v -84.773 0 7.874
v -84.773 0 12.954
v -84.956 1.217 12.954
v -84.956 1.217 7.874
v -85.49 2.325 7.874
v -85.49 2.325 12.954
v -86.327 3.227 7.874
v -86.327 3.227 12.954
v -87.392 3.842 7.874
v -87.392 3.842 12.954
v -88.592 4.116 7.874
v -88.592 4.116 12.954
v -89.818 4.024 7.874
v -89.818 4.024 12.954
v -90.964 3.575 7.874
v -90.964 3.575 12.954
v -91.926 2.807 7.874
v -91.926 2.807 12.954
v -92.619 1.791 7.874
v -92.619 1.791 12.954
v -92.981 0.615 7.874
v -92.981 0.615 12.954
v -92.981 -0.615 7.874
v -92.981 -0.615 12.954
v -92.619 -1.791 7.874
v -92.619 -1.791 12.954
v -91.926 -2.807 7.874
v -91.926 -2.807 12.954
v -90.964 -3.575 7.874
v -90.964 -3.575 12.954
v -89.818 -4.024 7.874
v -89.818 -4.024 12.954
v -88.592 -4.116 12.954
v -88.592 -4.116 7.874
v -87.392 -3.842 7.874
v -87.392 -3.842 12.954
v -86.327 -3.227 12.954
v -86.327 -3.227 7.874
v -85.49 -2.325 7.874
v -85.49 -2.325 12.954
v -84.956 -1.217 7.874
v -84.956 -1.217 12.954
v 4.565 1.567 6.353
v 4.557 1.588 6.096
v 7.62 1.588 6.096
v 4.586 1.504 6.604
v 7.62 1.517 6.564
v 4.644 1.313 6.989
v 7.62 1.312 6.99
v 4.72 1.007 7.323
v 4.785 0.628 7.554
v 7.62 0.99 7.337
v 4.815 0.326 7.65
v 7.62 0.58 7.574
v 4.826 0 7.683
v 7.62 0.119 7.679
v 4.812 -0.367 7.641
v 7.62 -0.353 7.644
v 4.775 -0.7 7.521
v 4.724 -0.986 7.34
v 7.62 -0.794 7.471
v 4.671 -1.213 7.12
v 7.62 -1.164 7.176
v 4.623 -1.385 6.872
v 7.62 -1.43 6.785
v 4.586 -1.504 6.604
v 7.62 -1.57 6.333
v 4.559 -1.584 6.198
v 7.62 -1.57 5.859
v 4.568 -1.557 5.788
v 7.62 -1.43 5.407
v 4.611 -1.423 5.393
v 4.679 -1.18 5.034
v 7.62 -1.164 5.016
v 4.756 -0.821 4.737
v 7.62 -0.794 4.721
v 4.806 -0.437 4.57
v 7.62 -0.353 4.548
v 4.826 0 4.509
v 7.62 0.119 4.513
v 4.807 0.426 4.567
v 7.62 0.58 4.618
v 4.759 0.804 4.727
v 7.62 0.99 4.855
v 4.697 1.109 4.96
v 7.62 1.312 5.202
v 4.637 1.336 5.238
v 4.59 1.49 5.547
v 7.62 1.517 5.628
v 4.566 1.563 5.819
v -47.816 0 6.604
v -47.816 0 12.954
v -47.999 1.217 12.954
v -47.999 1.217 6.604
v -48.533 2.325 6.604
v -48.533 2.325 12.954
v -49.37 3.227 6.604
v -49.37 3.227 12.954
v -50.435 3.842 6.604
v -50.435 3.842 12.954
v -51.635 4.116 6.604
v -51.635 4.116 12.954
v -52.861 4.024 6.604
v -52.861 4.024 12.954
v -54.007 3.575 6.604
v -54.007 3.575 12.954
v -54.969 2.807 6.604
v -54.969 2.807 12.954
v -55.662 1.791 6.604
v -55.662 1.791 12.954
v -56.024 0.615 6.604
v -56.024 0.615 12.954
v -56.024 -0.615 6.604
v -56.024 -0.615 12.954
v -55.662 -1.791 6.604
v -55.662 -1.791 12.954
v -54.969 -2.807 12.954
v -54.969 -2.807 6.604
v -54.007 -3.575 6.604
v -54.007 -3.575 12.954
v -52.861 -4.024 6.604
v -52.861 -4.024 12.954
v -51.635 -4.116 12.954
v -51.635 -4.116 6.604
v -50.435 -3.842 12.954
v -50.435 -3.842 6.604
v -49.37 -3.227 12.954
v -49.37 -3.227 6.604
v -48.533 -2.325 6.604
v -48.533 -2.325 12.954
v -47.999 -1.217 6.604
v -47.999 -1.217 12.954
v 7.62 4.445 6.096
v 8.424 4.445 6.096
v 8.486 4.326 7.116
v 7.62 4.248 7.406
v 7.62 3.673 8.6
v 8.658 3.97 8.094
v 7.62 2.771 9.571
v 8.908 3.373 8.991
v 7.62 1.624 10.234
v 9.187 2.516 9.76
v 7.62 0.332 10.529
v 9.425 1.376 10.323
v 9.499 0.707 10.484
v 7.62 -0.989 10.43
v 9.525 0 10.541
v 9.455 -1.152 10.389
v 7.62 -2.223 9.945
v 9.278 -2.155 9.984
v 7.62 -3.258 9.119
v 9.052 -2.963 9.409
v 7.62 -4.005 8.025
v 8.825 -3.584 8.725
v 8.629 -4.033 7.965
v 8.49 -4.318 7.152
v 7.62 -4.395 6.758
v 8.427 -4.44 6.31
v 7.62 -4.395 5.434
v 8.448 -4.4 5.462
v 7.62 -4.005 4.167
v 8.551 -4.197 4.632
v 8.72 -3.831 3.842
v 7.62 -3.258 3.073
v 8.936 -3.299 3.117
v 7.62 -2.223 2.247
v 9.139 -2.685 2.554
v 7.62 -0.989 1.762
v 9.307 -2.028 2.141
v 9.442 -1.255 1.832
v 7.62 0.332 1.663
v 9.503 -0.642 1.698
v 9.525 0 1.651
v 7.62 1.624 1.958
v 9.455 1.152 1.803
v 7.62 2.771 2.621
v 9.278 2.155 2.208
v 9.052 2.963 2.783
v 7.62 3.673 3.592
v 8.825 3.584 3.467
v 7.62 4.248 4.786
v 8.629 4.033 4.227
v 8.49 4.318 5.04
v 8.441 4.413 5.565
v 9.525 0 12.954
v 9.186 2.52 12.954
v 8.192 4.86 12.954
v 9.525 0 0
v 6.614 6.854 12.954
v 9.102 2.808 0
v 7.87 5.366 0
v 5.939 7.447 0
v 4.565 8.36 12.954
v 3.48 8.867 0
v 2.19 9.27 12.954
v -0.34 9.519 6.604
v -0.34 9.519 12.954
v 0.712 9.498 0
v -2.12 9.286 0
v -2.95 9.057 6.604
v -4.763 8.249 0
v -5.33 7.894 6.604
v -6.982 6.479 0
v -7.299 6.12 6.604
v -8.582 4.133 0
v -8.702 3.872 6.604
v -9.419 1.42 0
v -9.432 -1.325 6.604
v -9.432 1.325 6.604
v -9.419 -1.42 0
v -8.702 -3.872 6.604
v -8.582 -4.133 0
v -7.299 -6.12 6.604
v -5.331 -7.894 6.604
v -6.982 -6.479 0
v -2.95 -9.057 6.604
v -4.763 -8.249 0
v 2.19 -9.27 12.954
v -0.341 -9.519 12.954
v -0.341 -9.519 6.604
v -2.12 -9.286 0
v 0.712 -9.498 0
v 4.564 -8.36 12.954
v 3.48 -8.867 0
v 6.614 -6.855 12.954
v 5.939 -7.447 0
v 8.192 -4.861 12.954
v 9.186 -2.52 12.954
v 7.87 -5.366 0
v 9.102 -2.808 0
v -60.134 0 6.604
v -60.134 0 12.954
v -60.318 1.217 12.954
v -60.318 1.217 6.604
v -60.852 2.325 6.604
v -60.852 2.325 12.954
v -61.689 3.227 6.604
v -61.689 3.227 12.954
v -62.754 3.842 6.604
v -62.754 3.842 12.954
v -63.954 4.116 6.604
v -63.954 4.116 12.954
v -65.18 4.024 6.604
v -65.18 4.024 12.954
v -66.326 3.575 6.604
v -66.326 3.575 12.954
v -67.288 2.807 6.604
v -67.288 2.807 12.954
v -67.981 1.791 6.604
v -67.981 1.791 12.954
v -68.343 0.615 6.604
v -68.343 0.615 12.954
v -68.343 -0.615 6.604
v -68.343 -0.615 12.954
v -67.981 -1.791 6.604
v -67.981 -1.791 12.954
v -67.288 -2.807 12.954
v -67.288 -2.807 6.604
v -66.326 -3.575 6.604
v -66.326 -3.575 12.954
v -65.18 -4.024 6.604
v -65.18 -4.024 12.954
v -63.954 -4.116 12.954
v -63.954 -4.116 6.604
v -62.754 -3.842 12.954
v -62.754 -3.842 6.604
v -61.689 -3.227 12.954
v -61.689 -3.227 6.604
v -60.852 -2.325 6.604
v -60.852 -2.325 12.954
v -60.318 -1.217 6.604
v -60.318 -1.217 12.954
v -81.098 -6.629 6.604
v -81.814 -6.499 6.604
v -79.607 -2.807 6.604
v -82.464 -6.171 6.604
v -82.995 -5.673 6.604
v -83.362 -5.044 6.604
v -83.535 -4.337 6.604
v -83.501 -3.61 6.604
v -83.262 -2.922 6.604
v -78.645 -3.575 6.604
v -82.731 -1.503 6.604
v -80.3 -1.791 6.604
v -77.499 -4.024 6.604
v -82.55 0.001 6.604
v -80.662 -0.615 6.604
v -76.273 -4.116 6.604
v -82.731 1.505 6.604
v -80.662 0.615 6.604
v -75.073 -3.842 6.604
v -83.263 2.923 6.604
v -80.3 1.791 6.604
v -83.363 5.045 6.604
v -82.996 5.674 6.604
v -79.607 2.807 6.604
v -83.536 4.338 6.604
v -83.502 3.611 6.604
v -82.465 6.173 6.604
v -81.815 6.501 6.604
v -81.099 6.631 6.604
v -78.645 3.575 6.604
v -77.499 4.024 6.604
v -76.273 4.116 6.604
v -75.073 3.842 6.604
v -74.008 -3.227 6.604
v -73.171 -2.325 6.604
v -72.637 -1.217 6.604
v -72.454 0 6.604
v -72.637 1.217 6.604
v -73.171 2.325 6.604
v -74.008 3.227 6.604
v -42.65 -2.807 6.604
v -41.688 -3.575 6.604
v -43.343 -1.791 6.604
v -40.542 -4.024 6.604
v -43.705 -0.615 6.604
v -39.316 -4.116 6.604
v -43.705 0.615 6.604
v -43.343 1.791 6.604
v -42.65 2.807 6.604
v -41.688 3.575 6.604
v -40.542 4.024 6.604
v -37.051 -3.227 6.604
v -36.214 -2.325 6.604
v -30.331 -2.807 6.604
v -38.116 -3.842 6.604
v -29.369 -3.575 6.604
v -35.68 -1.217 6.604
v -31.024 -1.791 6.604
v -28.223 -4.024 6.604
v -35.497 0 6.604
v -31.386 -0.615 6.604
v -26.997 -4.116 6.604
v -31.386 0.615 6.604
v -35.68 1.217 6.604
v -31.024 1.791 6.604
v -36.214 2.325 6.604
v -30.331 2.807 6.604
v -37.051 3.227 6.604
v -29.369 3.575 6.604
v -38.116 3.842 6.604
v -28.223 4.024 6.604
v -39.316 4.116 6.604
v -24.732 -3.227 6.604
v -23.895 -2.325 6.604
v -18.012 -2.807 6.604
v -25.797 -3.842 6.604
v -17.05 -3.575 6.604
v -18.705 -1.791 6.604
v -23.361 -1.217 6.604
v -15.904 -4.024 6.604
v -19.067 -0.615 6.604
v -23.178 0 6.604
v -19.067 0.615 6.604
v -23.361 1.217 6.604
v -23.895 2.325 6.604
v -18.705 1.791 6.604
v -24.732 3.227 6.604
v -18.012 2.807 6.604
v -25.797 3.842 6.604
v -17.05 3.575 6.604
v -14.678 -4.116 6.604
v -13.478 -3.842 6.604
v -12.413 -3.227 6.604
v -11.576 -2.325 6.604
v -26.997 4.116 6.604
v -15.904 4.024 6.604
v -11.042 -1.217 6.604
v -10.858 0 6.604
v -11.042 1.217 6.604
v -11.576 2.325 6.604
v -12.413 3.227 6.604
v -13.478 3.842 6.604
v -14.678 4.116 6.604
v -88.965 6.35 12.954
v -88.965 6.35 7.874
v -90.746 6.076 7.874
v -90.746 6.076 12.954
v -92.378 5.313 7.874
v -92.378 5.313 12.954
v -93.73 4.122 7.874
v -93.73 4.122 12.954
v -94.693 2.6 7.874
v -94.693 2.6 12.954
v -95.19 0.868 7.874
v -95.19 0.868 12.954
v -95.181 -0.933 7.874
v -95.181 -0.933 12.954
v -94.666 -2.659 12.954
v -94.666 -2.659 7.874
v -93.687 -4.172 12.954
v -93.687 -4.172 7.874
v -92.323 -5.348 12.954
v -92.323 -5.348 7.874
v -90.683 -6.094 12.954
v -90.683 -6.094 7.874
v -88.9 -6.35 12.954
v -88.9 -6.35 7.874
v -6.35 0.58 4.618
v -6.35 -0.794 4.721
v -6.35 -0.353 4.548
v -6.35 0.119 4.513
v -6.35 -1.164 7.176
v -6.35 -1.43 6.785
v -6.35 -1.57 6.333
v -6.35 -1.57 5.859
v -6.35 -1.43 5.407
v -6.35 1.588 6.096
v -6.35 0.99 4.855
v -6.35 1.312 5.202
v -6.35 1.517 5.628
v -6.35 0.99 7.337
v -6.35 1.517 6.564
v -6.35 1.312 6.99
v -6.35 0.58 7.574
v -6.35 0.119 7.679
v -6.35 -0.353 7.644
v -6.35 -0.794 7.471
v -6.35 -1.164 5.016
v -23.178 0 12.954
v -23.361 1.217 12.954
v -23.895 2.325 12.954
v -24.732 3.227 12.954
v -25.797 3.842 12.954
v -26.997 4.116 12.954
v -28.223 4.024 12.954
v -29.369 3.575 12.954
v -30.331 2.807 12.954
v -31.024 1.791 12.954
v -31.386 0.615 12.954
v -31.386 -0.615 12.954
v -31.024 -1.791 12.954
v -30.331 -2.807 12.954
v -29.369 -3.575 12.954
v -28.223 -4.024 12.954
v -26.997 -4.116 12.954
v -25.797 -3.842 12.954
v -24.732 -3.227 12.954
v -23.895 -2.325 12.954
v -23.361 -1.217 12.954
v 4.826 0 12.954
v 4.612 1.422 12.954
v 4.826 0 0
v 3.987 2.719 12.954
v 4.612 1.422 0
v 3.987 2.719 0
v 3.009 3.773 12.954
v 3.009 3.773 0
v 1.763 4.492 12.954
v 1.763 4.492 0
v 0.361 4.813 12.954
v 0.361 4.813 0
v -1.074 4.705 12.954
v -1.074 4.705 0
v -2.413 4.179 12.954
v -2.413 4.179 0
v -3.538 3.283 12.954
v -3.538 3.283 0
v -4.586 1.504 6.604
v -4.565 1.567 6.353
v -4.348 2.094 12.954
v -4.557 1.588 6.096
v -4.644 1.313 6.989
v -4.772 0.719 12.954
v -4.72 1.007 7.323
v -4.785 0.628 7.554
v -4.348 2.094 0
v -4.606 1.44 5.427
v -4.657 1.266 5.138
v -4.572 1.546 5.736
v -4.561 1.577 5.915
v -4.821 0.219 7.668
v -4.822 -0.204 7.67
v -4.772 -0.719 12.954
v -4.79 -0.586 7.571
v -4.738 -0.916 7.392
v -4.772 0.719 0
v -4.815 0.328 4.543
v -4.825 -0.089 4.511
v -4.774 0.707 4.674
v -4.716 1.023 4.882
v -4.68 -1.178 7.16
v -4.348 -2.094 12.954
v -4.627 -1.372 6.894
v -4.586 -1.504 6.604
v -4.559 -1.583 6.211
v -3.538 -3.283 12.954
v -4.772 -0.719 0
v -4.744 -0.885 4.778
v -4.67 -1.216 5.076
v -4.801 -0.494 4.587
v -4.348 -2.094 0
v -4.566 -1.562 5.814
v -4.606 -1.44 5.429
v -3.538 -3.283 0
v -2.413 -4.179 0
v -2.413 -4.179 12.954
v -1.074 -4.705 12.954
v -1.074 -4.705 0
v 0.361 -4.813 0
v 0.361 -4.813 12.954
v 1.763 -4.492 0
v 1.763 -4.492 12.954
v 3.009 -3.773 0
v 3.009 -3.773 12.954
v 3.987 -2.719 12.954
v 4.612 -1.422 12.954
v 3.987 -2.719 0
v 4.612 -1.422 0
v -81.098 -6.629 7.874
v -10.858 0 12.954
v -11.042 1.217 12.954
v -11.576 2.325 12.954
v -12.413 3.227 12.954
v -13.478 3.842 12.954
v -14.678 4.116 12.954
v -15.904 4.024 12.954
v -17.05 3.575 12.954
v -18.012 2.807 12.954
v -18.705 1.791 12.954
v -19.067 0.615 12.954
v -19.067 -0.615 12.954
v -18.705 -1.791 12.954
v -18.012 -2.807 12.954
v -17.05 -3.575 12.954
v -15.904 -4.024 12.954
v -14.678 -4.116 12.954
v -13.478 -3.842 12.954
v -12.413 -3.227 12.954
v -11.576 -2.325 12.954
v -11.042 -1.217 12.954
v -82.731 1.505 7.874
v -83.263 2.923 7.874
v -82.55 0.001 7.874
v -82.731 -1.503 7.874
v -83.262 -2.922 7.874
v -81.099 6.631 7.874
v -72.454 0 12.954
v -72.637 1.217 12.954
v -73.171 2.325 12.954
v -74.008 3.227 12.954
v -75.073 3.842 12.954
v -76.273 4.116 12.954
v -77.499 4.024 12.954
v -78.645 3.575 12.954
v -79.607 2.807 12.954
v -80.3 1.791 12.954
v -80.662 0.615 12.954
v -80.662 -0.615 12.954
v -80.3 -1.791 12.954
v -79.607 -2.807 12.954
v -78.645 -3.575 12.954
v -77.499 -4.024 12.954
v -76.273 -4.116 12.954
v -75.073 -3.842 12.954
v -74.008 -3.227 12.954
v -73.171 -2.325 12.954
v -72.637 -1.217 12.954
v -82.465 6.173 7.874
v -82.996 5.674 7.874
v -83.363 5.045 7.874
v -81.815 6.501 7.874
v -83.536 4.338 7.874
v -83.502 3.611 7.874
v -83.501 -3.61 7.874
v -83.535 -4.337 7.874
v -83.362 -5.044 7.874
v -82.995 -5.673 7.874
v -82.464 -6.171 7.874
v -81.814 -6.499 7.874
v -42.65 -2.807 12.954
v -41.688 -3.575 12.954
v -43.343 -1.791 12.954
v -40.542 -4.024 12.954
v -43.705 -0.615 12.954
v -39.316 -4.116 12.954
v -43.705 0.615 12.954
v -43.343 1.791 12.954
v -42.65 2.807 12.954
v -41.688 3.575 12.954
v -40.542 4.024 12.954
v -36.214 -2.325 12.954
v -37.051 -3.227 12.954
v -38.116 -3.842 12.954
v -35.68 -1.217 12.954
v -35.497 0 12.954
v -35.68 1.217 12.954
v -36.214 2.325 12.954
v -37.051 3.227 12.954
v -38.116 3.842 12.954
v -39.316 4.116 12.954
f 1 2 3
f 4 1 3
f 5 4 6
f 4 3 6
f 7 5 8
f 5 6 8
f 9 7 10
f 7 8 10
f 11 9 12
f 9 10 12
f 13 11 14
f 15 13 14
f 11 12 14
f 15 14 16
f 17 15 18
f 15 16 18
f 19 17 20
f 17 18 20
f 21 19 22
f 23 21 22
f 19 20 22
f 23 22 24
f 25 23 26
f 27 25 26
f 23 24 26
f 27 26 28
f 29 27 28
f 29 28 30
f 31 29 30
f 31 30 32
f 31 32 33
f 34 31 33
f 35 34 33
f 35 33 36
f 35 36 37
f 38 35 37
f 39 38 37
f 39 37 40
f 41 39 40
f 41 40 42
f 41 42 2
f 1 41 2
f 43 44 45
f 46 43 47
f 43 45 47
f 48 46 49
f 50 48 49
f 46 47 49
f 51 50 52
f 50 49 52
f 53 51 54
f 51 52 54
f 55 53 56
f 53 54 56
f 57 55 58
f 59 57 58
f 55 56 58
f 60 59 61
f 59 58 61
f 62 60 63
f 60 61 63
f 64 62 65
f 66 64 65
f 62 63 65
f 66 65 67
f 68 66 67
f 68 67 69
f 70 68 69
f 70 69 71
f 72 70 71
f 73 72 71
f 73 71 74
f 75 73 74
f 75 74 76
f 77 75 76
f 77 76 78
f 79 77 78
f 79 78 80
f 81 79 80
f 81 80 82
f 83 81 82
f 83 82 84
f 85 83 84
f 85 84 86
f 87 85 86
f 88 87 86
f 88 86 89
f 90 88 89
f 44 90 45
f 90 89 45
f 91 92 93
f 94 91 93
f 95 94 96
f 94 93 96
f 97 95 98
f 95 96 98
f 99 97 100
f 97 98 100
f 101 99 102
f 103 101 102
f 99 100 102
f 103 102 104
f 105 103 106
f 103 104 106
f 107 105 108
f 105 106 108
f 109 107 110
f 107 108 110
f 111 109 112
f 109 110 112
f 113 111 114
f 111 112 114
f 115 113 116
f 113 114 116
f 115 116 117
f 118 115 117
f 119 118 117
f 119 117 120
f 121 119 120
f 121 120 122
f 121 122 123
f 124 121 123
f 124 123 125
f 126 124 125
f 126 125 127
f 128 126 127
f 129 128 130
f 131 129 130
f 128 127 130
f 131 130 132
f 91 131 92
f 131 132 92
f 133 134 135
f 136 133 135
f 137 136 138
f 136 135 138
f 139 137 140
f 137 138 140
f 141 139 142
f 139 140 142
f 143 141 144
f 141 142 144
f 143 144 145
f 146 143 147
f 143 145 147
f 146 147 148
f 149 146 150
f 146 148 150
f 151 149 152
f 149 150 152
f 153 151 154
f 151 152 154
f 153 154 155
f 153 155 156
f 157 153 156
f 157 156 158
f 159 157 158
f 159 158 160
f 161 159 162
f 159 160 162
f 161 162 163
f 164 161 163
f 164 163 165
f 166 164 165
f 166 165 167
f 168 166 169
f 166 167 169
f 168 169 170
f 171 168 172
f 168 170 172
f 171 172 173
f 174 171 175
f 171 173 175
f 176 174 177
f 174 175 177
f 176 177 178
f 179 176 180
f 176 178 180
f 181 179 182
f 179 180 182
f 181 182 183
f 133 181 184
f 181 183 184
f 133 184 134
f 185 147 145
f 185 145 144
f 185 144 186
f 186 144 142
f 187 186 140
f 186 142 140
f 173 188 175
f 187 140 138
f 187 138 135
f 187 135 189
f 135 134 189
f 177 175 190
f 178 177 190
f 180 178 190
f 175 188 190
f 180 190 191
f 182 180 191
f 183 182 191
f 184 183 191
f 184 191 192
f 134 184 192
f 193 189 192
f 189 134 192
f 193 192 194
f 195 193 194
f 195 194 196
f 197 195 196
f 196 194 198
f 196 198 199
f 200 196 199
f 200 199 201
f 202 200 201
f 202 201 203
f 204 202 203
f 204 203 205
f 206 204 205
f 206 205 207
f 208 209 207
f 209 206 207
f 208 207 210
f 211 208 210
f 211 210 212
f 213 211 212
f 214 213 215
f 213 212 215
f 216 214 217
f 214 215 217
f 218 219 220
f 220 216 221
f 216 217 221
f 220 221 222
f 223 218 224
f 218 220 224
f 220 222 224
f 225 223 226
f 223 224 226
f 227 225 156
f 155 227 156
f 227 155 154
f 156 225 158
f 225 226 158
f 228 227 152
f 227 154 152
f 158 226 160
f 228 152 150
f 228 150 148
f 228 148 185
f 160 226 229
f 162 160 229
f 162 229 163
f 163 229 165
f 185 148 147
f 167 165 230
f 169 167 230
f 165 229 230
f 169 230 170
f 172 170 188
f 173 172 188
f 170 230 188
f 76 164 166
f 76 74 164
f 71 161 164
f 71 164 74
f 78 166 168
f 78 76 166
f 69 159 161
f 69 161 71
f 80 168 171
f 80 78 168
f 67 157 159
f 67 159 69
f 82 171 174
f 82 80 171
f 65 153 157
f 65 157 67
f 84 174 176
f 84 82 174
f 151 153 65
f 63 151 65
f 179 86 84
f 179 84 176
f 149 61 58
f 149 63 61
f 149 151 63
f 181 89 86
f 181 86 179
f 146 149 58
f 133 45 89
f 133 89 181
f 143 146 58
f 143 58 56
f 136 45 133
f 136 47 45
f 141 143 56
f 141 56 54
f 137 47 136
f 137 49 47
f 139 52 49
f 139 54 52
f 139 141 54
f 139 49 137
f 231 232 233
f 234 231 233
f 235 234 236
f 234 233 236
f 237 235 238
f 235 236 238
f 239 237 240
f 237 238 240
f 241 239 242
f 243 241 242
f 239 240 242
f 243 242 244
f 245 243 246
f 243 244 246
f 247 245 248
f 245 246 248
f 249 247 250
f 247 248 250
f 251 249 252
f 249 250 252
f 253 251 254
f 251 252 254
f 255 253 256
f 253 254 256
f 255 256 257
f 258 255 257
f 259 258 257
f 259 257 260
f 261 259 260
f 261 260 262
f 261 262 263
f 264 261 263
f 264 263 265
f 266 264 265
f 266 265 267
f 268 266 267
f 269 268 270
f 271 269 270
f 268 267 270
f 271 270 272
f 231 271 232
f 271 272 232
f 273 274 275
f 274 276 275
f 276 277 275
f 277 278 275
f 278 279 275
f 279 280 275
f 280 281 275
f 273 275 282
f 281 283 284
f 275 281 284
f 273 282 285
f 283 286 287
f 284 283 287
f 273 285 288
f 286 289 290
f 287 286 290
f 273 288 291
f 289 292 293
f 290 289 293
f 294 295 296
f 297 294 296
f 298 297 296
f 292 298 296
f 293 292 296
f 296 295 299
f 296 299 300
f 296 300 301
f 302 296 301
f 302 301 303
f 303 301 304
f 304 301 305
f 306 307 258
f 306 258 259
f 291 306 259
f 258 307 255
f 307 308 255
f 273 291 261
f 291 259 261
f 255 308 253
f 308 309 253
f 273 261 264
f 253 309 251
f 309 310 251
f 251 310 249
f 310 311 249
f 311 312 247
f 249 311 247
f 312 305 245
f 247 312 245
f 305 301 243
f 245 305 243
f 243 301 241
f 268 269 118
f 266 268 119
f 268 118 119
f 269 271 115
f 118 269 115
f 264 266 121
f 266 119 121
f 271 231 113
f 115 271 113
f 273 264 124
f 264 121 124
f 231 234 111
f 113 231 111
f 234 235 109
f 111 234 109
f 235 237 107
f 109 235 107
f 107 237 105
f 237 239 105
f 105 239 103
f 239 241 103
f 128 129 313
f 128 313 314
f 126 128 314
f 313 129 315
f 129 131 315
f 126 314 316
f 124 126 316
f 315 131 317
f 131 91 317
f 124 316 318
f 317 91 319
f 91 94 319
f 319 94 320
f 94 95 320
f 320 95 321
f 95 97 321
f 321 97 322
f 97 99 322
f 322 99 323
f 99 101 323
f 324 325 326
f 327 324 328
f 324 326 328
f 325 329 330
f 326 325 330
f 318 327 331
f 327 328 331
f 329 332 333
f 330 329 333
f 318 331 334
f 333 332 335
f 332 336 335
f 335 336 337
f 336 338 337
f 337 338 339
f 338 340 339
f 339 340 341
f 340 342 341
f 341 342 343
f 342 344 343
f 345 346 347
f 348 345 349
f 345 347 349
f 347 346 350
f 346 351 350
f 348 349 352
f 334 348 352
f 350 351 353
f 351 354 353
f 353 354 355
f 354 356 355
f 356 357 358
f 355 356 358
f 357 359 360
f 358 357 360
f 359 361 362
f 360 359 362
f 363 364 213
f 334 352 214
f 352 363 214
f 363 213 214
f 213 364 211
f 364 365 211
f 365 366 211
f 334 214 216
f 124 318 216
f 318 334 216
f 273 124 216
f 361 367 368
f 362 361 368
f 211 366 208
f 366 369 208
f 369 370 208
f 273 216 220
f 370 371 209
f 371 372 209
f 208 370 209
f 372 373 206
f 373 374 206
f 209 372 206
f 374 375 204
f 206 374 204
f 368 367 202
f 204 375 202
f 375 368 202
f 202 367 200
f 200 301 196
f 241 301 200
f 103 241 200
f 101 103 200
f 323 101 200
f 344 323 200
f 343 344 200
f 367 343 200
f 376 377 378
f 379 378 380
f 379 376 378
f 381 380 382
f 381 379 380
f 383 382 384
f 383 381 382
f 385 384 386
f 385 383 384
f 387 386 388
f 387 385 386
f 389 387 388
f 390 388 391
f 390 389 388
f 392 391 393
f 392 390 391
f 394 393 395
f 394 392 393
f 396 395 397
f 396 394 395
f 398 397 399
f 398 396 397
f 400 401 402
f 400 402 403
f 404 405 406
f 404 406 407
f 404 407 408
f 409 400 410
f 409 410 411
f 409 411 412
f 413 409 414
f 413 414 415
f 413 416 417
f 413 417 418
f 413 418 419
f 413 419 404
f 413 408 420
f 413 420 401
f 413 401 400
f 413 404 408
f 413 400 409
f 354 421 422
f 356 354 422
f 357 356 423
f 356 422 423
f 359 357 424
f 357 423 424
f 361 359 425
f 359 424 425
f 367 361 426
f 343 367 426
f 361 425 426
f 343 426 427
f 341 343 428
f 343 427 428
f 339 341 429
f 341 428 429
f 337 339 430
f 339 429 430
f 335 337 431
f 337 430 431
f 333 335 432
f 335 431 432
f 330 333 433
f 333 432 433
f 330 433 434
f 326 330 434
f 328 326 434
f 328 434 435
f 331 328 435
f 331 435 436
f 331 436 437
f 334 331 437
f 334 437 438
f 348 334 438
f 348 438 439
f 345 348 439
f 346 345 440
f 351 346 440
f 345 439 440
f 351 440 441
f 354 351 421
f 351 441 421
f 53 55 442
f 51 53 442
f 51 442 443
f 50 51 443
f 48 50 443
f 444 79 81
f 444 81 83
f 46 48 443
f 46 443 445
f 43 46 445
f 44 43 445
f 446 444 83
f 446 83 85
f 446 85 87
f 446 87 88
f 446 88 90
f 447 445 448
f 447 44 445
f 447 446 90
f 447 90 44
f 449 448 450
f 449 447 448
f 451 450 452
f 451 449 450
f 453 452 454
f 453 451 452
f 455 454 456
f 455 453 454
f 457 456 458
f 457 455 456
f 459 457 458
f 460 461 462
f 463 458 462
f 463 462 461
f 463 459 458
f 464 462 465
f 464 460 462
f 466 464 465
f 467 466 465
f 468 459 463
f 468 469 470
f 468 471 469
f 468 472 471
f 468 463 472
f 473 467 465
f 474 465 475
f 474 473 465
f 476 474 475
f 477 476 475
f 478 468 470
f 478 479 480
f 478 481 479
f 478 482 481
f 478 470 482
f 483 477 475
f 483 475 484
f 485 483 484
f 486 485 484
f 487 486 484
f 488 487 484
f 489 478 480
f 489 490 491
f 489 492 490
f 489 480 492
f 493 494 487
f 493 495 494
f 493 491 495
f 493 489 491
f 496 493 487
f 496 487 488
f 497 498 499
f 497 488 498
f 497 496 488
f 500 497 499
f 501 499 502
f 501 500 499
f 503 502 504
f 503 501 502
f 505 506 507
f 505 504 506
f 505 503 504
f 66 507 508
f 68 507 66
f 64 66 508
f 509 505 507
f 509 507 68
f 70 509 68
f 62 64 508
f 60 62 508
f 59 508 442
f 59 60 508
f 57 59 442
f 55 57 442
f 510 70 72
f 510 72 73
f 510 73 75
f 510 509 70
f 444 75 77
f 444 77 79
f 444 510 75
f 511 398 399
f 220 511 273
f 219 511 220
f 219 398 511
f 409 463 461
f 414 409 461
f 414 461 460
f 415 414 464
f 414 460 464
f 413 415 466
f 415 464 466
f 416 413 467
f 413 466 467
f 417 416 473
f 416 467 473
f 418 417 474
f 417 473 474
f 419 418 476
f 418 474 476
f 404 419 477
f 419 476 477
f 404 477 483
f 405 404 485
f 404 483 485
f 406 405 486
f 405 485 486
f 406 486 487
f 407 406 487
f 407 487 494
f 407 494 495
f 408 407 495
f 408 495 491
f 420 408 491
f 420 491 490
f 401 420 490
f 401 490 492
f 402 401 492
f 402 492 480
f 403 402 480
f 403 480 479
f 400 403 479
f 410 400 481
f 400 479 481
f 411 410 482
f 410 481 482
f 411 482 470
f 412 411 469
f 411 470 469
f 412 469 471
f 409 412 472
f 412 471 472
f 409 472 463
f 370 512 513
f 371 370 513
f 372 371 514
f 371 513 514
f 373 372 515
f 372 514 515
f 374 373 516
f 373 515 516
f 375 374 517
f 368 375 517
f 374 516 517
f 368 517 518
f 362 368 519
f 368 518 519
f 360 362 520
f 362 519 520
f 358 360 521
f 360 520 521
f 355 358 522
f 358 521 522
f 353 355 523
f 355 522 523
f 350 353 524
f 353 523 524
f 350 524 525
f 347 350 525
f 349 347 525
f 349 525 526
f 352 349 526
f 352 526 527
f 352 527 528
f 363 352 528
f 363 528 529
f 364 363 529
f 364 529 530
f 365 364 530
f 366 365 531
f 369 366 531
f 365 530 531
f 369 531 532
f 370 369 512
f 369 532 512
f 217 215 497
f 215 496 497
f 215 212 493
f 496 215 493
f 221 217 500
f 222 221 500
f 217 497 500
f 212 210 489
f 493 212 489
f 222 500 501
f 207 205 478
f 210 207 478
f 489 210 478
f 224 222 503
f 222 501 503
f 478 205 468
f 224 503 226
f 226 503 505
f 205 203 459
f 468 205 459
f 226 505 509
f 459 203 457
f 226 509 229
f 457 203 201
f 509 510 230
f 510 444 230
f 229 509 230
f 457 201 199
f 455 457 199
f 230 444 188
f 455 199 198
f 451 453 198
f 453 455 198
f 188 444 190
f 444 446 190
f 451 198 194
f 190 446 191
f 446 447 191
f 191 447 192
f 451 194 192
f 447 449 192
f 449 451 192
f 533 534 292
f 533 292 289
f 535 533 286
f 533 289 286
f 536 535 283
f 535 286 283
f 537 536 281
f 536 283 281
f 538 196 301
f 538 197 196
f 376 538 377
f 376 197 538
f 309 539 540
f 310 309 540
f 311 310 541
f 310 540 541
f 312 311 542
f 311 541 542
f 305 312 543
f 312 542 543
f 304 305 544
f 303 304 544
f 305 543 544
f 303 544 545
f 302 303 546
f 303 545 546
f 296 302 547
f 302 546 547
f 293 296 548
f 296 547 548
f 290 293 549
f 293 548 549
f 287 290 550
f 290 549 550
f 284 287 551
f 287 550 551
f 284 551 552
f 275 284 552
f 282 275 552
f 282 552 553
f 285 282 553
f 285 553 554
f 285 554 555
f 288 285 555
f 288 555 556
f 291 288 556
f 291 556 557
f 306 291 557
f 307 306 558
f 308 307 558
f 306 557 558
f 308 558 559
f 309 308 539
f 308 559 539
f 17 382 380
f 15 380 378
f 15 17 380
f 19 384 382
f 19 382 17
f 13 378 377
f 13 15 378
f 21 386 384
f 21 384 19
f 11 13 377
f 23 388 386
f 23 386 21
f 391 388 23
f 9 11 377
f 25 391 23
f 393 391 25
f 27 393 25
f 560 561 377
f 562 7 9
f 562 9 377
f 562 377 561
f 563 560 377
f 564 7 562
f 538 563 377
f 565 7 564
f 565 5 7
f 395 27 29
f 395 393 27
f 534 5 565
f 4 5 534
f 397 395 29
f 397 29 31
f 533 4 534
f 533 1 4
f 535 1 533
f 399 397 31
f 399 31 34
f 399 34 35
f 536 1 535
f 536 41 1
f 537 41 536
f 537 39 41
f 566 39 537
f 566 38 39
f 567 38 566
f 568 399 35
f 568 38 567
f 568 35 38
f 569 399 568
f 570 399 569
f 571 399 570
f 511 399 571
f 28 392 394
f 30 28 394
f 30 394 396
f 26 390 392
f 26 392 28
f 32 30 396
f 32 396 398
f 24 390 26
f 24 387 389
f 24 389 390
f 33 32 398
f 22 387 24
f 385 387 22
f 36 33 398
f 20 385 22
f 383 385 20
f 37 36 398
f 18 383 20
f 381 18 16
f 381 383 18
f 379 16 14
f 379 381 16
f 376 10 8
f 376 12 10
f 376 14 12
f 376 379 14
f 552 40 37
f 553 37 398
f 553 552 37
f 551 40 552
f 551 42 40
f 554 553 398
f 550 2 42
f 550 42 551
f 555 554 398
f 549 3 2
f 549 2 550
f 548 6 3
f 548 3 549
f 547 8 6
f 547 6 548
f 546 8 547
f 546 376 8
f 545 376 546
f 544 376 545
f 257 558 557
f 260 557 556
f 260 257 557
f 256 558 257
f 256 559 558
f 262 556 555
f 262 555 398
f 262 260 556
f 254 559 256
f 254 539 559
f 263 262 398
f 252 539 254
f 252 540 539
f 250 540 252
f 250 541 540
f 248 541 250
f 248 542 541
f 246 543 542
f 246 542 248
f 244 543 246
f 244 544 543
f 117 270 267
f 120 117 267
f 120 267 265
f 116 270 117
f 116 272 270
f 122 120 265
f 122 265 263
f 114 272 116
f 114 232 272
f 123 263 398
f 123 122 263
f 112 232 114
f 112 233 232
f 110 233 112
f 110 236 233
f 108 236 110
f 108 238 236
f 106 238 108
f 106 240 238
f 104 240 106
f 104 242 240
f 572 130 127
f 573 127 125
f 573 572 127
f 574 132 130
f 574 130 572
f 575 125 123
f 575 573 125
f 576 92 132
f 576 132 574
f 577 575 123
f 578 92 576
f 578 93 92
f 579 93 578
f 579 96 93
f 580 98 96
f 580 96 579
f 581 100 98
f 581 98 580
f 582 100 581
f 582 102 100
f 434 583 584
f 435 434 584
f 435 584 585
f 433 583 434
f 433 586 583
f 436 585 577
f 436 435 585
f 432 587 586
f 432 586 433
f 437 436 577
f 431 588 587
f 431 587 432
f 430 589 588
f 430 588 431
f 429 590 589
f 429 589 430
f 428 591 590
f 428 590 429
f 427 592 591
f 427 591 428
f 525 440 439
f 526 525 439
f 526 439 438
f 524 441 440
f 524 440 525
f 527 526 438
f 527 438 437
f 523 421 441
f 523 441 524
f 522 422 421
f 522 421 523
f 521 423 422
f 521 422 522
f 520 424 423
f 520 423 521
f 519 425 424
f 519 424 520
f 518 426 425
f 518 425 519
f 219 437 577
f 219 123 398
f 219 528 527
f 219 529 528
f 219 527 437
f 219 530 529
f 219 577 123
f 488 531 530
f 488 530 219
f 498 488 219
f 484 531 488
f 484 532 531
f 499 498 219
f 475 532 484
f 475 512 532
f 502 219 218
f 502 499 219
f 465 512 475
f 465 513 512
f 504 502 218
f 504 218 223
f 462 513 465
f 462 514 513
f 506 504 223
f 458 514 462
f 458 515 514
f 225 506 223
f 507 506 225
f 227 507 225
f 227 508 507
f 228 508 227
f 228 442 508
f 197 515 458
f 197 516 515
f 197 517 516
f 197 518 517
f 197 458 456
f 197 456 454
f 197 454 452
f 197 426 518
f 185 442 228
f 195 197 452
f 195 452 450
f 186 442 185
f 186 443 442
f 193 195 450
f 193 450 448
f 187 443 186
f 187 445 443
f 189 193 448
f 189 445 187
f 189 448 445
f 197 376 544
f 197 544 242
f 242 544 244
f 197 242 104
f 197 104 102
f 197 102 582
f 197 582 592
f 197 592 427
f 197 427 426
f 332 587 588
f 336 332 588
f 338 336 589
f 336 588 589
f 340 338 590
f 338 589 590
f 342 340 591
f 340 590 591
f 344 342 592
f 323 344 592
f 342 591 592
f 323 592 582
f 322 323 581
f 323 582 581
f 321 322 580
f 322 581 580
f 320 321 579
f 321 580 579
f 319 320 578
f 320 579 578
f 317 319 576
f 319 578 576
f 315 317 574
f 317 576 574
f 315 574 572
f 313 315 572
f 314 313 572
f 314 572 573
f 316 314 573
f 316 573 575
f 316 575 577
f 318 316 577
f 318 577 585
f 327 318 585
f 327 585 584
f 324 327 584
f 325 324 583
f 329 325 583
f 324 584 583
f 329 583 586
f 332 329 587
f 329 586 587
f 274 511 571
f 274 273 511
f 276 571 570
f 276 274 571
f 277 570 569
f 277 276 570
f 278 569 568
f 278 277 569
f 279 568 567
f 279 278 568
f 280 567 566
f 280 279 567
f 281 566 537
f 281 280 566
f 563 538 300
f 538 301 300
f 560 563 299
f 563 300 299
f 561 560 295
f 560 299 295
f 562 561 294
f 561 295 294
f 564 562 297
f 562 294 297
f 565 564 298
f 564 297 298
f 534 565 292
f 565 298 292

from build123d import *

# Parameters (mm, degrees)
F0_R      = 9.525
F0_R_2    = 4.826
F1_DEPTH  = 12.954
F2_R      = 4.1275
F3_DEPTH  = 6.35
F5_R      = 1.5875
F6_DEPTH  = 31.75
F7_DEPTH  = 25.4
F8_R      = 6.35
F9_DEPTH  = 1.27
F5_R_2    = 4.445
F10_DEPTH = 17.78
F11_R     = 2.54


with BuildPart() as f1:
    # F0 (on Top) → F1 (new body)
    with BuildSketch(Plane.XY):
        Circle(F0_R)
        Circle(F0_R_2, mode=Mode.SUBTRACT)
    extrude(amount=F1_DEPTH)

    # F2 (on face) → F3 (join)
    with BuildSketch(Plane.XY.offset(12.954)):
        with BuildLine():
            ThreePointArc((-0.3406139649, -9.5189078747), (6.6136705763, -6.8545595415), (9.525, 0))
            ThreePointArc((9.525, 0), (6.6137479521, 6.8544848841), (-0.3403990606, 9.5189155622))
            ThreePointArc((-0.3403990606, 9.5189155622), (-9.5249999994, 0.0001075209), (-0.3406139649, -9.5189078747))
        make_face()
        with BuildLine():
            ThreePointArc((-0.3406139649, -9.5189078747), (-9.5249999994, 0.0001075209), (-0.3403990606, 9.5189155622))
            Line((-0.3403990606, 9.5189155622), (-88.965388203, 6.3496633283))
            ThreePointArc((-88.965388203, 6.3496633283), (-84.4330499829, 4.5131870717), (-82.55, 0))
            ThreePointArc((-82.55, 0), (-84.4098719395, -4.4901280605), (-88.9, -6.35))
            Line((-88.9, -6.35), (-0.3406139649, -9.5189078747))
        make_face()
        with Locations((-76.581, 0)):
            Circle(F2_R, mode=Mode.SUBTRACT)
        with Locations((-64.262, 0)):
            Circle(F2_R, mode=Mode.SUBTRACT)
        with Locations((-51.943, 0)):
            Circle(F2_R, mode=Mode.SUBTRACT)
        with Locations((-39.624, 0)):
            Circle(F2_R, mode=Mode.SUBTRACT)
        with Locations((-27.305, 0)):
            Circle(F2_R, mode=Mode.SUBTRACT)
        with Locations((-14.986, 0)):
            Circle(F2_R, mode=Mode.SUBTRACT)
        with BuildLine():
            ThreePointArc((-82.55, 0), (-84.4330499829, 4.5131870717), (-88.965388203, 6.3496633283))
            ThreePointArc((-88.965388203, 6.3496633283), (-95.2499158315, -0.0326945349), (-88.9, -6.35))
            ThreePointArc((-88.9, -6.35), (-84.4098719395, -4.4901280605), (-82.55, 0))
        make_face()
        with Locations((-88.9, 0)):
            Circle(F2_R, mode=Mode.SUBTRACT)
    extrude(amount=-F3_DEPTH)

    # F5 (on offset) → F6 (cut)
    with BuildSketch(Plane.YZ.offset(25.4)):
        with Locations((0, 6.096)):
            Circle(F5_R)
    extrude(amount=-F6_DEPTH, mode=Mode.SUBTRACT)

    # F0 (on Top) → F7 (cut)
    with BuildSketch(Plane.XY):
        Circle(F0_R_2)
    extrude(amount=F7_DEPTH, mode=Mode.SUBTRACT)

    # F8 (on face) → F9 (cut)
    with BuildSketch(Plane(origin=(0, 0, 6.604), x_dir=(1, 0, 0), z_dir=(0, 0, -1))):
        with Locations((-88.9, 0)):
            Circle(F8_R)
    extrude(amount=-F9_DEPTH, mode=Mode.SUBTRACT)

    # F5 (on offset) → F10 (cut)
    with BuildSketch(Plane.YZ.offset(25.4)):
        with Locations((0, 6.096)):
            Circle(F5_R_2)
        with Locations((0, 6.096)):
            Circle(F5_R, mode=Mode.SUBTRACT)
    extrude(amount=-F10_DEPTH, mode=Mode.SUBTRACT)

    # F11
    f11_edges = [f1.edges().sort_by_distance(p)[0] for p in [
        (-88.9, -6.35, 10.414),
        (-88.9, -6.35, 7.239),
        (-88.965388, 6.349663, 10.414),
        (-88.965388, 6.349663, 7.239),
    ]]
    fillet(f11_edges, radius=F11_R)


solid = f1.part
